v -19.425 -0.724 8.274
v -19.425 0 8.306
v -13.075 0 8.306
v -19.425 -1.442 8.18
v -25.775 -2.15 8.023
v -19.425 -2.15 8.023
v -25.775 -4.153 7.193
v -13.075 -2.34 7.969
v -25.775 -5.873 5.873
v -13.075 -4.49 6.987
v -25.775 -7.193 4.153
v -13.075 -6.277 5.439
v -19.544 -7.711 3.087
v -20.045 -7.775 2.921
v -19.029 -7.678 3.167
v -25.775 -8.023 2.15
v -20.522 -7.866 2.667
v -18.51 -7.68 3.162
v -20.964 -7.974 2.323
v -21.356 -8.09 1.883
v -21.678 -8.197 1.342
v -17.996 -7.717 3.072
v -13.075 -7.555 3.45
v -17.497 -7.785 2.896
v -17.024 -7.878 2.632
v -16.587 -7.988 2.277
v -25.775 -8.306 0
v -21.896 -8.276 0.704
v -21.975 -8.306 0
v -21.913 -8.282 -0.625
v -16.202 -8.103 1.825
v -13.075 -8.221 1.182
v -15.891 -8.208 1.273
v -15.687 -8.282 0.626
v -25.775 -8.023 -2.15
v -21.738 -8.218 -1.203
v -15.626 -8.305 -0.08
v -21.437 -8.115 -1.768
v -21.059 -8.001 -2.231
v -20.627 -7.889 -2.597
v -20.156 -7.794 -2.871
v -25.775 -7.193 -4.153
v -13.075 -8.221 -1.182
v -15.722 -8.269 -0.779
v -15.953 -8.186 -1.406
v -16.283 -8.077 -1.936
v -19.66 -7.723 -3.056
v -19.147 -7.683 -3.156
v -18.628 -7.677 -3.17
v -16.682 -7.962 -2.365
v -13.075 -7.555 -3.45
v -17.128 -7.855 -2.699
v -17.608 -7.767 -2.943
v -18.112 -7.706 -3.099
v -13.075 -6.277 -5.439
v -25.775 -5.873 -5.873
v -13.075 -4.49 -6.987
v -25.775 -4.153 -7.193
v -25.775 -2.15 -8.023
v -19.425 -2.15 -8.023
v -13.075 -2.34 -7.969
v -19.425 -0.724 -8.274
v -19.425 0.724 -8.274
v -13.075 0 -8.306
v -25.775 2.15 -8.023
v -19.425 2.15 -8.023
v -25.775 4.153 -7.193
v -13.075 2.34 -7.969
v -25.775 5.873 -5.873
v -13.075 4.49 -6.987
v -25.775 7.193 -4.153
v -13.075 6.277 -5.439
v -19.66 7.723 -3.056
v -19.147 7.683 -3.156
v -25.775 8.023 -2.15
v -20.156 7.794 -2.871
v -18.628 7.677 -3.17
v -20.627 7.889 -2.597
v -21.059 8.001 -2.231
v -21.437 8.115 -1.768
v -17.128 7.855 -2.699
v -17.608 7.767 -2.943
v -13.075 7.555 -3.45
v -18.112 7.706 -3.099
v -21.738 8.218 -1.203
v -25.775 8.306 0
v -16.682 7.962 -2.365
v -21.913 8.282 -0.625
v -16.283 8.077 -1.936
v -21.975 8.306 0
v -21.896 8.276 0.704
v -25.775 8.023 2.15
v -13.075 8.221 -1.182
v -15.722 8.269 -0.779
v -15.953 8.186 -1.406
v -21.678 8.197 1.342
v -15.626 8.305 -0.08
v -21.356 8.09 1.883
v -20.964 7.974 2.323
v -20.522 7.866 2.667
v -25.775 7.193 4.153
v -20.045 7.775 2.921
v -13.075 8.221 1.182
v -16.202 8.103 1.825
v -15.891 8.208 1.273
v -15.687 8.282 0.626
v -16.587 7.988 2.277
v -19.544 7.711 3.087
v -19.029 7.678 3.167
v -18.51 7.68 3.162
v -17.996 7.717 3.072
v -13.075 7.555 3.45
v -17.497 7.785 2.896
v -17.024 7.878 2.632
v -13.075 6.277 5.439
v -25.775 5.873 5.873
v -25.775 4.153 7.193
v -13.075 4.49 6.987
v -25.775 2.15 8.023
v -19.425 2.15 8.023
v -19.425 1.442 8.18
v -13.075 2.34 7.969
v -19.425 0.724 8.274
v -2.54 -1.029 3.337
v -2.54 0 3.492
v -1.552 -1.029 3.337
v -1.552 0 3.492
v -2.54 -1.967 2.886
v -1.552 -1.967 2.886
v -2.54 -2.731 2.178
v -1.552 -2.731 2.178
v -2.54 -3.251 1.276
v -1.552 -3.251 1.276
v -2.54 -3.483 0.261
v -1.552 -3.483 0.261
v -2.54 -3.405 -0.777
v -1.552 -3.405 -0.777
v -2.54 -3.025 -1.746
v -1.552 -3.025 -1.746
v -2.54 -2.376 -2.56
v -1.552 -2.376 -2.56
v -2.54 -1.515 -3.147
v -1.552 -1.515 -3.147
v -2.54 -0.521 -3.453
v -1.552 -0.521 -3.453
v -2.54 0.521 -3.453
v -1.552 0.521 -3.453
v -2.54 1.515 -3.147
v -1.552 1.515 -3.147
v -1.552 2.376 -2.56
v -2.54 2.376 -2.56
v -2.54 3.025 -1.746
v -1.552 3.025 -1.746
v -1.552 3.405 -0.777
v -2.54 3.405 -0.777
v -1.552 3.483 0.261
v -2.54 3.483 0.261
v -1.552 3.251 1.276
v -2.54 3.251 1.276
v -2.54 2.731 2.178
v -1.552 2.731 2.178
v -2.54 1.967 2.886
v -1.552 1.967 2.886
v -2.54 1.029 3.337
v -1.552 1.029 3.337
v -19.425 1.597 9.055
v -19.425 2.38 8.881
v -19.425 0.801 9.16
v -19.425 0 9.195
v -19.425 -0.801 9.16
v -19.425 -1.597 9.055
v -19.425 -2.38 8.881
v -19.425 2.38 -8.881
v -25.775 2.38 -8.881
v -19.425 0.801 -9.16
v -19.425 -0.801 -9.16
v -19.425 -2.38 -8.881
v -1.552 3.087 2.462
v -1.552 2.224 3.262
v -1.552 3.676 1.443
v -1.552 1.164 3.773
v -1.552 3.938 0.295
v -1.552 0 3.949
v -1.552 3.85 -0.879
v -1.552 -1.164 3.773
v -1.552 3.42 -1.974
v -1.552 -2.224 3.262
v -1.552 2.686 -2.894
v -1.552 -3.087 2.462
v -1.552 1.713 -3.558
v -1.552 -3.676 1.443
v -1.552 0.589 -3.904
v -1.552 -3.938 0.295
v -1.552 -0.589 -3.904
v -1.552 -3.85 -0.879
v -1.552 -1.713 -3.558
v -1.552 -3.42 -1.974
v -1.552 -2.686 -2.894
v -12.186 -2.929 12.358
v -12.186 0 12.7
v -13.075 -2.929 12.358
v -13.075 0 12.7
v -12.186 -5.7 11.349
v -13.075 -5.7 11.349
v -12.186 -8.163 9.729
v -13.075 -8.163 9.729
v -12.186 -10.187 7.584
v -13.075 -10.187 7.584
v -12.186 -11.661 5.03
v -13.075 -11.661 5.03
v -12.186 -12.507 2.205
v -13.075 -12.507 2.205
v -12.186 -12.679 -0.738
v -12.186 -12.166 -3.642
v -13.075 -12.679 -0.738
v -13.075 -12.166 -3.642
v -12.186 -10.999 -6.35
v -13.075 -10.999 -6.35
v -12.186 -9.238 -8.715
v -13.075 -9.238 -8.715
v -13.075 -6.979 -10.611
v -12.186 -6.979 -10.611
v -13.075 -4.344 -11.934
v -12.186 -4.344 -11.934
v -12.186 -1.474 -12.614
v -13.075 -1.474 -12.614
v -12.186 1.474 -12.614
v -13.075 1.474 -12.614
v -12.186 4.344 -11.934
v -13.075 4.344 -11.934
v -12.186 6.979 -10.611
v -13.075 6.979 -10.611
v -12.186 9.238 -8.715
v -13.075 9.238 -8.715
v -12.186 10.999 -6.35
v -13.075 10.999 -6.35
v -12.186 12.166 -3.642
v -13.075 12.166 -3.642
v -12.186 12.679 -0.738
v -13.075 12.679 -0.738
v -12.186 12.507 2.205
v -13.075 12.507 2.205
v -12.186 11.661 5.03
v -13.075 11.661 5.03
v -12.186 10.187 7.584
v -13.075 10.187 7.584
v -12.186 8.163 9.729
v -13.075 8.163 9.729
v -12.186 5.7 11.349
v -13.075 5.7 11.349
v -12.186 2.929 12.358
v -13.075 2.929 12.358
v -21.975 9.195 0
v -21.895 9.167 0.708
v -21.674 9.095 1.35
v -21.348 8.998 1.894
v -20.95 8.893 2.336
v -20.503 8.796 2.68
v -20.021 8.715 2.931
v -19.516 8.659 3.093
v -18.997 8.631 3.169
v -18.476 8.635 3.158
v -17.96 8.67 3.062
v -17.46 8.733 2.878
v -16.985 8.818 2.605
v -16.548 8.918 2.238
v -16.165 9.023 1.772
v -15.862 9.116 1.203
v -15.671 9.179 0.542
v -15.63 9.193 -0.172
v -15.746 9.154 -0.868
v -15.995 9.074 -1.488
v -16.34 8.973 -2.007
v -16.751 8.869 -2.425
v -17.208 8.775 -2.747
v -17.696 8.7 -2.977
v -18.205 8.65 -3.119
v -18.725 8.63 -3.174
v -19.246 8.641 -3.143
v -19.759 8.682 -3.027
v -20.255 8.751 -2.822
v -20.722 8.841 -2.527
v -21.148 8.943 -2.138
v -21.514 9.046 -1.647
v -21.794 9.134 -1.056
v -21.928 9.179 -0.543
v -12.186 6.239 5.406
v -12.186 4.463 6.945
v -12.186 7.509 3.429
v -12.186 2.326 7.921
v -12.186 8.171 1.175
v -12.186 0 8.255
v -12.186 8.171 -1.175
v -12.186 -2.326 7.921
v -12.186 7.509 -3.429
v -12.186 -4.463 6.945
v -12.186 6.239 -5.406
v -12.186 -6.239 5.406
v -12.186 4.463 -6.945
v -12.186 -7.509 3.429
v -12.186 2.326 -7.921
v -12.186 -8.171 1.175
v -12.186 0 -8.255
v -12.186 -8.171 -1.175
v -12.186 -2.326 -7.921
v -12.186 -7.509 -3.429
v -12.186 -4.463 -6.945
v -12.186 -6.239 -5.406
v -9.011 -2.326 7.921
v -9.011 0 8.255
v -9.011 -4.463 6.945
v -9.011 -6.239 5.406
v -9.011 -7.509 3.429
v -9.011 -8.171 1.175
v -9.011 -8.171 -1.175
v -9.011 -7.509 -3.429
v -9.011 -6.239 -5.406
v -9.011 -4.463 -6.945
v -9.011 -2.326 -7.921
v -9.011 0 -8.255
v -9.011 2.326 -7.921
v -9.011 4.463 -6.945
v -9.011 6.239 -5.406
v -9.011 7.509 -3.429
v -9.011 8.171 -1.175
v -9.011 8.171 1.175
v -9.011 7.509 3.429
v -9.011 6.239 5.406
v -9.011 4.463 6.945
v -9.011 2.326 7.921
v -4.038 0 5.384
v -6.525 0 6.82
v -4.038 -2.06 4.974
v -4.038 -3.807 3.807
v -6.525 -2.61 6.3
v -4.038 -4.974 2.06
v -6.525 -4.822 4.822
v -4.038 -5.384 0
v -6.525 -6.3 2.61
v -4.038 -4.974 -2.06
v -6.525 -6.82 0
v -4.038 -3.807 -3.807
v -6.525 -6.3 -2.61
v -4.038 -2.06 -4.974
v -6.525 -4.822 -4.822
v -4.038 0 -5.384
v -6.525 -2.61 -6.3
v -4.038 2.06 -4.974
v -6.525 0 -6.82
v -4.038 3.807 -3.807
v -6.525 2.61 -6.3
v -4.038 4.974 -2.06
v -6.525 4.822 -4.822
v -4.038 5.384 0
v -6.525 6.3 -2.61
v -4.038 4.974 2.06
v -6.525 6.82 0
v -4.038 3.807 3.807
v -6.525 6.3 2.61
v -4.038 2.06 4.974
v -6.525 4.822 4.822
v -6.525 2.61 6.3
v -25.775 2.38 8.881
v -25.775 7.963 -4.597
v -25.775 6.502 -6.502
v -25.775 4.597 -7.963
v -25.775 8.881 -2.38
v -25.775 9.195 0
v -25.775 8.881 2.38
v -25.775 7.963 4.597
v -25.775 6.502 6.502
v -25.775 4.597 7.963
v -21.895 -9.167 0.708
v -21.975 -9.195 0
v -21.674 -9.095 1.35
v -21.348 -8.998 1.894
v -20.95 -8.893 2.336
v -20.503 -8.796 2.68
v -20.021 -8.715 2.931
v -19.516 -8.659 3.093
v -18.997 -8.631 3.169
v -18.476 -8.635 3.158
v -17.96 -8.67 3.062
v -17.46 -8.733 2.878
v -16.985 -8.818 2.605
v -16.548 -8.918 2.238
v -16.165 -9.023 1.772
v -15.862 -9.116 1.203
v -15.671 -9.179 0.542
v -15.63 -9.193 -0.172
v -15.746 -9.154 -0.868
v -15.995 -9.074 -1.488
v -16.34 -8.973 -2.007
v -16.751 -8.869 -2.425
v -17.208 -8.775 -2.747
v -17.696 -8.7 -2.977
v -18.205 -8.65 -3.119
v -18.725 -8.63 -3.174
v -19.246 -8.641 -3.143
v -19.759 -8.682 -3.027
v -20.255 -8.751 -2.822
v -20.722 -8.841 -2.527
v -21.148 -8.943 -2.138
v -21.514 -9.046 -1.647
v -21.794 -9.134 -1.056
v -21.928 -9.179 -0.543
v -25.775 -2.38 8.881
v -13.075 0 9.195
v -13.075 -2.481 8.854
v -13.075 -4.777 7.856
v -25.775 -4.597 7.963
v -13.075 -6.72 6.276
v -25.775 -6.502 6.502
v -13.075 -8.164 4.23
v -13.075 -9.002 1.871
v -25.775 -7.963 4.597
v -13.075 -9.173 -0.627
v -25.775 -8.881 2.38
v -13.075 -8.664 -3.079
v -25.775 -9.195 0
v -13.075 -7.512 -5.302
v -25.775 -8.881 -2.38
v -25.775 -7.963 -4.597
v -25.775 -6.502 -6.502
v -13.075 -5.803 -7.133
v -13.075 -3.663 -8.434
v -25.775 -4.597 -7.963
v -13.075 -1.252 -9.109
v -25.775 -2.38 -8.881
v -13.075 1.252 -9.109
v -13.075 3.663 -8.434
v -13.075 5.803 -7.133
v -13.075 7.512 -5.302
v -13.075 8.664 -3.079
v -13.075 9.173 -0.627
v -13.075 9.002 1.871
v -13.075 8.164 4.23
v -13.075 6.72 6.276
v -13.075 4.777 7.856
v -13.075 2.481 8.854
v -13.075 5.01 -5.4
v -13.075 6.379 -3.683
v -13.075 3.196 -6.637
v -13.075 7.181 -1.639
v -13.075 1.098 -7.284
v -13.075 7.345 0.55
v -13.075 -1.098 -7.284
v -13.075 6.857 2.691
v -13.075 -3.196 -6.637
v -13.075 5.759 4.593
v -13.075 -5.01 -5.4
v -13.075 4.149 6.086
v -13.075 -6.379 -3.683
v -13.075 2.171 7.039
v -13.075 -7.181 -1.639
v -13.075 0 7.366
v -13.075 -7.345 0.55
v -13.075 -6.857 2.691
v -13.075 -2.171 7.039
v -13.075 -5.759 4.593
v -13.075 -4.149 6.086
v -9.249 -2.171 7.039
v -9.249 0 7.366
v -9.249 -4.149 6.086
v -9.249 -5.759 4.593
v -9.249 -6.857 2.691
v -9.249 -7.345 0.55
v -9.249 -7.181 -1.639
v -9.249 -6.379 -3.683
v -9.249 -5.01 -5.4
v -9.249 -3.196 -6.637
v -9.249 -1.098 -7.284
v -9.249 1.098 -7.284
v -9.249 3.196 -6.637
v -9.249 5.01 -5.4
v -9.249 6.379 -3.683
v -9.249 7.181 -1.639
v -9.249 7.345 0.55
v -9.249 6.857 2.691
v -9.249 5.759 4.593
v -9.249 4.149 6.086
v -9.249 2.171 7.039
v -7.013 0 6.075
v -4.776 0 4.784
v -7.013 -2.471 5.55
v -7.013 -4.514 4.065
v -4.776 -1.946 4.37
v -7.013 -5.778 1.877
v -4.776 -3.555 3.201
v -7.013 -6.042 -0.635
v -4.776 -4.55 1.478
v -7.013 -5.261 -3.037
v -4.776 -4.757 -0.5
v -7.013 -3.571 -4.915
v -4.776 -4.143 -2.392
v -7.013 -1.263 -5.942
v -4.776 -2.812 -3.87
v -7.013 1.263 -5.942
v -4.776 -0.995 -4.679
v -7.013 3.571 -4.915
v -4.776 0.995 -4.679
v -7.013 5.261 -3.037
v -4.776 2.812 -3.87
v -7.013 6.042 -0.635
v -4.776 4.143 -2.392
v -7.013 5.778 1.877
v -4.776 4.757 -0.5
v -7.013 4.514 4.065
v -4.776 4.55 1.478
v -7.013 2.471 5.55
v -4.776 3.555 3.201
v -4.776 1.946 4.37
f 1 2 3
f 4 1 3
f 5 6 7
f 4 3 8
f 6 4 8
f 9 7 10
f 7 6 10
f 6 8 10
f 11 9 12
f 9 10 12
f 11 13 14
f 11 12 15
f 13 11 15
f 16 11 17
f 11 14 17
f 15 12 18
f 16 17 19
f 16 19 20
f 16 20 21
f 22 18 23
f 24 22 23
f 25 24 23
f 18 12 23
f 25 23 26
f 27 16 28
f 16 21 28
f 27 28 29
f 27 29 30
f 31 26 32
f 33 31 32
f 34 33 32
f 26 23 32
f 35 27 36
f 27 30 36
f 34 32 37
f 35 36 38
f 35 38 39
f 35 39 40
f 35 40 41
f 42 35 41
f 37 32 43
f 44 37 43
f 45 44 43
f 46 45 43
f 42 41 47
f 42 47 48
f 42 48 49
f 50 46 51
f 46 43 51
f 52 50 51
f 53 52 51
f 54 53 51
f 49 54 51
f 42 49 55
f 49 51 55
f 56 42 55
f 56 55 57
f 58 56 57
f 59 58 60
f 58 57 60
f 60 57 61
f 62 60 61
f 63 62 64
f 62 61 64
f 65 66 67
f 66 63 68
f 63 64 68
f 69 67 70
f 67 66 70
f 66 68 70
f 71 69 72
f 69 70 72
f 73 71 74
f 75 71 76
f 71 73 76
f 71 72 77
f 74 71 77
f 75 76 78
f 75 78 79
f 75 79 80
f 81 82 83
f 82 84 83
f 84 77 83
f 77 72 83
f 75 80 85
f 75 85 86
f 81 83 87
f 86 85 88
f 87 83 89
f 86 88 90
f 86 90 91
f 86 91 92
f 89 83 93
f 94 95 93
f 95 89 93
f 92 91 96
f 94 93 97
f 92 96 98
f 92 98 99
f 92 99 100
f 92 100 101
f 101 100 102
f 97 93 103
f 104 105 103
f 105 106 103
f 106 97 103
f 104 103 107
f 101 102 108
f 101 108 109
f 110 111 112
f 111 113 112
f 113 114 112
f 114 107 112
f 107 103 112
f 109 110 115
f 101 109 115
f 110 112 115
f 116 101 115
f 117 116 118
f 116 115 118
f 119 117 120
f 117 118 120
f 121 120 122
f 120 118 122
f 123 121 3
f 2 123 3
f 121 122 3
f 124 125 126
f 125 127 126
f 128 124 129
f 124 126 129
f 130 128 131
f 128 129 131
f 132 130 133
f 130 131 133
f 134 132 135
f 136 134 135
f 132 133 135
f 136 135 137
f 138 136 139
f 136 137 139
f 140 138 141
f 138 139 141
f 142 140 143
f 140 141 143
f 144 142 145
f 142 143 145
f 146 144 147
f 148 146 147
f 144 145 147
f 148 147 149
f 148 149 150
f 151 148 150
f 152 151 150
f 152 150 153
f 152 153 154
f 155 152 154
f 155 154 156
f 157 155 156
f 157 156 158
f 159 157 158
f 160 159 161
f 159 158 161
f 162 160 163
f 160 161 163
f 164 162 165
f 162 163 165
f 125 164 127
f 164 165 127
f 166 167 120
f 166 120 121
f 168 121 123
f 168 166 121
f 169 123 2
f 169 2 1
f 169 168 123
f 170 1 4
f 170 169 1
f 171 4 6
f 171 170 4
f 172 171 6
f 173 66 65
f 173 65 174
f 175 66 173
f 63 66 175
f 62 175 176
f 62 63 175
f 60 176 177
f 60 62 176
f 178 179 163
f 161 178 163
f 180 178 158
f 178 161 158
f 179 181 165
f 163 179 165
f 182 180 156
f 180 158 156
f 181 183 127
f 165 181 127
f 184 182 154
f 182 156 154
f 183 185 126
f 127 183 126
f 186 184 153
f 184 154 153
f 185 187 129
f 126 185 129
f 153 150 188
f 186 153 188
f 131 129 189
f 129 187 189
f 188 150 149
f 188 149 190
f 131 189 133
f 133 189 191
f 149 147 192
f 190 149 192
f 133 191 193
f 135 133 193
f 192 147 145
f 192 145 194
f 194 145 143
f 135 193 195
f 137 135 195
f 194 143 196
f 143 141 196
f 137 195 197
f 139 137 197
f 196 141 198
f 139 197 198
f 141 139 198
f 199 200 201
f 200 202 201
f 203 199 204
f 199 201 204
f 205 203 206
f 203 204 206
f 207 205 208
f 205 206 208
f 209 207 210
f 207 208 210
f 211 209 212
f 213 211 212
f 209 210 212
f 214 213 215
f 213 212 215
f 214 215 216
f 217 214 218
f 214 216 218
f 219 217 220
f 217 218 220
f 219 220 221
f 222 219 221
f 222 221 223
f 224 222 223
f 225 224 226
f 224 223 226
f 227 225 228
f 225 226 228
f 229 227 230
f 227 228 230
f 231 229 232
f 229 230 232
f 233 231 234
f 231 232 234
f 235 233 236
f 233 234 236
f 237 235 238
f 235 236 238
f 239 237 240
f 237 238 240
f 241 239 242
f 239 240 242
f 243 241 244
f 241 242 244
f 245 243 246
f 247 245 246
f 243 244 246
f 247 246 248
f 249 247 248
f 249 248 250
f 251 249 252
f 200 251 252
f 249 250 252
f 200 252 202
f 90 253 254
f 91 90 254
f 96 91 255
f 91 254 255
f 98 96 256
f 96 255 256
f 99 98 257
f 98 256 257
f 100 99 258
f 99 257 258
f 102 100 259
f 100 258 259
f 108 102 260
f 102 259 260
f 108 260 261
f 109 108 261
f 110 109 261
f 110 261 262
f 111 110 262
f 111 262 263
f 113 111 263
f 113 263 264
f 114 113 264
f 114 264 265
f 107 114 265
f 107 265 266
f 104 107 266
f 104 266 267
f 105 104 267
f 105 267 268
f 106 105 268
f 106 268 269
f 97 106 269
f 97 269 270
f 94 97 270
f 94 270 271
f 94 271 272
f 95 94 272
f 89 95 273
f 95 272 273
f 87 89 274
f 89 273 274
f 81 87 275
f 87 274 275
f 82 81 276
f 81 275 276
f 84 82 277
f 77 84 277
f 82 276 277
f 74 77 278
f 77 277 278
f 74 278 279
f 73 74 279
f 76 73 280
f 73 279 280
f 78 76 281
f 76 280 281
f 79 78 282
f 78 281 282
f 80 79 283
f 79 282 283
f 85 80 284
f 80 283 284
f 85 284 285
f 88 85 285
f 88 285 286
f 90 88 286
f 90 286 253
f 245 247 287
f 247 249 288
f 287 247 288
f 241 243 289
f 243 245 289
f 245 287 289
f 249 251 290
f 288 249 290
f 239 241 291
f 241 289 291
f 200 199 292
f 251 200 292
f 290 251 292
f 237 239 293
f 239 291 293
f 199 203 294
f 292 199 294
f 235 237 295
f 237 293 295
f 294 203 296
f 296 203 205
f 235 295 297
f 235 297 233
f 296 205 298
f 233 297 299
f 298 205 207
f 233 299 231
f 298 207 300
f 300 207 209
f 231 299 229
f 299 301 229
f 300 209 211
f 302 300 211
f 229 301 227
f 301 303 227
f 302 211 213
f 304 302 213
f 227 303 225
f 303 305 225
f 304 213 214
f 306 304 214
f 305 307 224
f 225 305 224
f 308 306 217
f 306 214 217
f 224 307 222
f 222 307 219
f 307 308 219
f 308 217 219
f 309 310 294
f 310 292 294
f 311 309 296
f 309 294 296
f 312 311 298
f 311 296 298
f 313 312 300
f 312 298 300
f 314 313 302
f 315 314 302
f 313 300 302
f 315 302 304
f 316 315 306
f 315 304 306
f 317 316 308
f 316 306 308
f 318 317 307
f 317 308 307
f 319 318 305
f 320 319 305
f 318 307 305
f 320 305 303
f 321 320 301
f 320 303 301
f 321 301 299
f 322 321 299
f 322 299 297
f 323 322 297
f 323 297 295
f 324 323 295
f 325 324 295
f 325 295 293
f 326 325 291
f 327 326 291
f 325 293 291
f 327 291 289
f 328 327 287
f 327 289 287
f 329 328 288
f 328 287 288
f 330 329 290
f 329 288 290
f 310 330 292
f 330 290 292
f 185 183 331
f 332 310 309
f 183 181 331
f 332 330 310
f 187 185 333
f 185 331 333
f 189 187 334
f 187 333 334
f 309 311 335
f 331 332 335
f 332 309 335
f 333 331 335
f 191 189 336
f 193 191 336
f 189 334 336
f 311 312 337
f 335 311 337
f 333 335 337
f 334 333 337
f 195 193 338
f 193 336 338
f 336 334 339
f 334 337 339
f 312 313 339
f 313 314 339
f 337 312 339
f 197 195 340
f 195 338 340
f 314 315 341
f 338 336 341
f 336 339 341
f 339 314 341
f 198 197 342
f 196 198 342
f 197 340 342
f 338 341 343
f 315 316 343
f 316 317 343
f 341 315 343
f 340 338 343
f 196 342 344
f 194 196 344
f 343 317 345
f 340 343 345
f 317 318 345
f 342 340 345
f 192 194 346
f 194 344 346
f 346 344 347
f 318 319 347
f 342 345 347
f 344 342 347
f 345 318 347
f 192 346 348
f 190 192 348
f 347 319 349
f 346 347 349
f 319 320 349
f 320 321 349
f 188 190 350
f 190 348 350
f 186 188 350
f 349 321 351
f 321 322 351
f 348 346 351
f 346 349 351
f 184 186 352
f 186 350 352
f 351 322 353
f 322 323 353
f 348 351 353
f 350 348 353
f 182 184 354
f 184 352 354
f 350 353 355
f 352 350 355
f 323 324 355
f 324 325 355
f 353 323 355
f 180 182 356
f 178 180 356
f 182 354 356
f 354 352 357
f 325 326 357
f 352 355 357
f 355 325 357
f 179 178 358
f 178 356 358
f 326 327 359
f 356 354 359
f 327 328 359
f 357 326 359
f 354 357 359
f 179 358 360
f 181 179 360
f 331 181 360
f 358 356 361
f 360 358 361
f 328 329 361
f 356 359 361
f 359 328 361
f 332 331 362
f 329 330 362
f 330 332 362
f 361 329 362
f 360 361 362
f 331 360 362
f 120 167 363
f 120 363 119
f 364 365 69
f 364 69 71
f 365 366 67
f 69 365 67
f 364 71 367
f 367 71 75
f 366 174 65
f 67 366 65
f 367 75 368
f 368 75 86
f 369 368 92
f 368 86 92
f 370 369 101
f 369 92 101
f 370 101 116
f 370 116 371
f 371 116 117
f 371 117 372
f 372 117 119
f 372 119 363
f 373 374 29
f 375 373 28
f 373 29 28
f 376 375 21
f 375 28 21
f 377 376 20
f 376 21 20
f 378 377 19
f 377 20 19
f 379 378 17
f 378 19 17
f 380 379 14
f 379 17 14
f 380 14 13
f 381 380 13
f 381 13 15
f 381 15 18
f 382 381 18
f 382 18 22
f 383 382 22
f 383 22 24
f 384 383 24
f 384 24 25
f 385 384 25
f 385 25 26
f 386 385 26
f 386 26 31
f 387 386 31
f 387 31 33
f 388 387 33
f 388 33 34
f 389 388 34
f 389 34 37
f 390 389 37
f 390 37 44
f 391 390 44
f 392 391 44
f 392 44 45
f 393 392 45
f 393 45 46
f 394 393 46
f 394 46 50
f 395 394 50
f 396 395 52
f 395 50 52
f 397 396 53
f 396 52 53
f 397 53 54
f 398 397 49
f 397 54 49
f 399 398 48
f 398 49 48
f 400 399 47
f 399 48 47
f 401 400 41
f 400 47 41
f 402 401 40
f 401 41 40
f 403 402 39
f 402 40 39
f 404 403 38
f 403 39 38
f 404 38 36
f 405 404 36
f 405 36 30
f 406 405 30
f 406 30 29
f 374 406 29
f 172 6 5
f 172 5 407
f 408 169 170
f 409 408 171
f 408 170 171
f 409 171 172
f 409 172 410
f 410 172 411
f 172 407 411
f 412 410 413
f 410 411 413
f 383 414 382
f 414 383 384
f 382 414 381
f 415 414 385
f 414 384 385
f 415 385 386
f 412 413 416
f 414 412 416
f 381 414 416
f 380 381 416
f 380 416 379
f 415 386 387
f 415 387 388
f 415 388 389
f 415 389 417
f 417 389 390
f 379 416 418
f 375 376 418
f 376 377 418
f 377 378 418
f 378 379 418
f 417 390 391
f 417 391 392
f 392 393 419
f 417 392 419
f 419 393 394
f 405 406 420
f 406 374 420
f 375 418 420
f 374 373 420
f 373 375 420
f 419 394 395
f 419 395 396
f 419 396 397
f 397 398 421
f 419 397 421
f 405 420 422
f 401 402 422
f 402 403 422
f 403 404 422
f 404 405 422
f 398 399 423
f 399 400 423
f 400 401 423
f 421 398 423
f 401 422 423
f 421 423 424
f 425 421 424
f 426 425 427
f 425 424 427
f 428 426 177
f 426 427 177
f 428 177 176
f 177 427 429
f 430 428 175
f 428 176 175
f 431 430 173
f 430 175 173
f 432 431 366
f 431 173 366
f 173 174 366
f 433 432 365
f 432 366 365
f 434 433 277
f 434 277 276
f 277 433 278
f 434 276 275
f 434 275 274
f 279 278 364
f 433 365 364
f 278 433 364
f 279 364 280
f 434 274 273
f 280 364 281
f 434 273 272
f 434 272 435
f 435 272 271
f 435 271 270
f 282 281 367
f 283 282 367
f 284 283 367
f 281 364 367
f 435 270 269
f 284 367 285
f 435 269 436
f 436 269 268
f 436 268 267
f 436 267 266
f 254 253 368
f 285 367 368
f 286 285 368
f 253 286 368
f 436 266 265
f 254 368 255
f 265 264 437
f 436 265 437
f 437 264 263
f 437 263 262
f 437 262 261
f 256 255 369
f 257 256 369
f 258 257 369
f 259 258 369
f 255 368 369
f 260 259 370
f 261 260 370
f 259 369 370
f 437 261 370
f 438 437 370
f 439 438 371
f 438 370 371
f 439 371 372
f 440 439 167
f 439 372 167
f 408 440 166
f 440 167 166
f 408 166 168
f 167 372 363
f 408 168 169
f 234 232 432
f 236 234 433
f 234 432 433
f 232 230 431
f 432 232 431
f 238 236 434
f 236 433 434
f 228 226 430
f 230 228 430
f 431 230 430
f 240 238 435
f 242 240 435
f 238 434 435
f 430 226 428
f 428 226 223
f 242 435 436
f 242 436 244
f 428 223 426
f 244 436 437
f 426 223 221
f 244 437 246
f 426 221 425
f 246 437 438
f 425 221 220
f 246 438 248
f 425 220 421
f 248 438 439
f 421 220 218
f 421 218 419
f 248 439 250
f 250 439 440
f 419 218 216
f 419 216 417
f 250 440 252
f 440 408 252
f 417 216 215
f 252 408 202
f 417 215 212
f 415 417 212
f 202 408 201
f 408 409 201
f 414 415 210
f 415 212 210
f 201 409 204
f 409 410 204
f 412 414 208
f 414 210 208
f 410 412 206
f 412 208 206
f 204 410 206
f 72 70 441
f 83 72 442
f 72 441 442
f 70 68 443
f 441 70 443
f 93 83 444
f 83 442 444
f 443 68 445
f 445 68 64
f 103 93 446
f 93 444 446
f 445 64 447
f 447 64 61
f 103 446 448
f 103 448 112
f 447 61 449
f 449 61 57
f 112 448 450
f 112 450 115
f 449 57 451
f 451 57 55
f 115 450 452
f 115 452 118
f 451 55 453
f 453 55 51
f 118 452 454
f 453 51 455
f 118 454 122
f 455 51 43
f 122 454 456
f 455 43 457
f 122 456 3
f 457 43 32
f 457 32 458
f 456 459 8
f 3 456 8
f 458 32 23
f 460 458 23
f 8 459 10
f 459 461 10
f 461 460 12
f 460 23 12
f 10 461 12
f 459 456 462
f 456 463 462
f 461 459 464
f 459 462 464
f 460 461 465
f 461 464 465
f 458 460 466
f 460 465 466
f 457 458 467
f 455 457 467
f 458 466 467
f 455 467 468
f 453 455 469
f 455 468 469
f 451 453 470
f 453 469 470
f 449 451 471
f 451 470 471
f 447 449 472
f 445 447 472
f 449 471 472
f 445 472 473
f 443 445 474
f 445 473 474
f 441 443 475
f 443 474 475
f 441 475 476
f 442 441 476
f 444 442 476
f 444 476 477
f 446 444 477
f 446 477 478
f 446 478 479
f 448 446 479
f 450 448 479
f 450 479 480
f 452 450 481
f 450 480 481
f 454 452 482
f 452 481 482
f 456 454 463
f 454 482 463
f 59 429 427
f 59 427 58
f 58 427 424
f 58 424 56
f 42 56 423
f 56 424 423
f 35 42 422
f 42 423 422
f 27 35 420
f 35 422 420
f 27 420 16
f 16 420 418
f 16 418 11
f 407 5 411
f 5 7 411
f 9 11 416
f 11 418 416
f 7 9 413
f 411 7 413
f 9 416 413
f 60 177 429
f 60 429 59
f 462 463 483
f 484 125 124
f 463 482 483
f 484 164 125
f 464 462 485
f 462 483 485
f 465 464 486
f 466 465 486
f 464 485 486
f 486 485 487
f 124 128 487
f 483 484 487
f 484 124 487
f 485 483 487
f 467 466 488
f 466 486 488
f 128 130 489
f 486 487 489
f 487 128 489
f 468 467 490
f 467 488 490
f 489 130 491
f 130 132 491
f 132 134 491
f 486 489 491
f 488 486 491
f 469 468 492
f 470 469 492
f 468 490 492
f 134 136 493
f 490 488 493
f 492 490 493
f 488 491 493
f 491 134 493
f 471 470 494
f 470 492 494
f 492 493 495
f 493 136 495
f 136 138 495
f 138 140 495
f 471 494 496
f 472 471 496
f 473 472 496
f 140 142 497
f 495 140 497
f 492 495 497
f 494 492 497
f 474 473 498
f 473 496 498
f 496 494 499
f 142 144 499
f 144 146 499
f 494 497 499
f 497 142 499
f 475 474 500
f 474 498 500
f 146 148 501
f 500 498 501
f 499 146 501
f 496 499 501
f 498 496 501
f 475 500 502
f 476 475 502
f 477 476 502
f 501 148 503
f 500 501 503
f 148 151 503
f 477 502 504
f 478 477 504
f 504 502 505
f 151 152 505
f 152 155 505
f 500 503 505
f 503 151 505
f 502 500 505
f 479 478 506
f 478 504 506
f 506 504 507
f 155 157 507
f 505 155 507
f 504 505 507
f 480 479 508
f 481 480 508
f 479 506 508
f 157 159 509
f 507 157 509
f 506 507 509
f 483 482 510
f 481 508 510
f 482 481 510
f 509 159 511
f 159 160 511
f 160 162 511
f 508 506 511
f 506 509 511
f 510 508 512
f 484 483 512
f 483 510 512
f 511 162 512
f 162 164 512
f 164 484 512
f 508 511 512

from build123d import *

# Parameters (mm, degrees)
F3_DEPTH = 6.35
F5_D     = 6.35
F6_D     = 6.35


with BuildPart() as f1:
    # F0 (on Front) → F1 (revolve)
    with BuildSketch(Plane.XZ):
        Polygon((-12.185892, 12.7), (-13.074892, 12.7), (-13.074892, 9.1948), (-25.774892, 9.1948), (-25.774892, 8.3058), (-13.074892, 8.3058), (-13.074892, 7.366), (-9.249099, 7.366), (-2.54, 3.4925), (-1.551914, 3.4925), (-1.551914, 3.948557), (-9.010892, 8.255), (-12.185892, 8.255), align=None)
    revolve(axis=Axis((-0.259, 0, 0), (1, 0, 0)))

    # F2 (on face) → F3 (cut)
    with BuildSketch(Plane(origin=(-25.774892, 0, 0), x_dir=(0, -1, 0), z_dir=(-1, 0, 0))):
        with BuildLine():
            Line((2.149699, 8.022787), (2.379789, 8.881495))
            ThreePointArc((2.379789, 8.881495), (0, 9.1948), (-2.379789, 8.881495))
            Line((-2.379789, 8.881495), (-2.149699, 8.022787))
            ThreePointArc((-2.149699, 8.022787), (0, 8.3058), (2.149699, 8.022787))
        make_face()
        with BuildLine():
            Line((-2.149699, -8.022787), (-2.379789, -8.881495))
            ThreePointArc((-2.379789, -8.881495), (0, -9.1948), (2.379789, -8.881495))
            Line((2.379789, -8.881495), (2.149699, -8.022787))
            ThreePointArc((2.149699, -8.022787), (0, -8.3058), (-2.149699, -8.022787))
        make_face()
    extrude(amount=-F3_DEPTH, mode=Mode.SUBTRACT)

    # F5 (through all)
    with Locations(Plane.XZ):
        with Locations((-18.799923, 0)):
            Hole(F5_D / 2)

    # F6 (through all)
    with Locations(Plane(origin=(0, 0, 0), x_dir=(1, 0, 0), z_dir=(0, 1, 0))):
        with Locations((-18.799923, 0)):
            Hole(F6_D / 2)


solid = f1.part
